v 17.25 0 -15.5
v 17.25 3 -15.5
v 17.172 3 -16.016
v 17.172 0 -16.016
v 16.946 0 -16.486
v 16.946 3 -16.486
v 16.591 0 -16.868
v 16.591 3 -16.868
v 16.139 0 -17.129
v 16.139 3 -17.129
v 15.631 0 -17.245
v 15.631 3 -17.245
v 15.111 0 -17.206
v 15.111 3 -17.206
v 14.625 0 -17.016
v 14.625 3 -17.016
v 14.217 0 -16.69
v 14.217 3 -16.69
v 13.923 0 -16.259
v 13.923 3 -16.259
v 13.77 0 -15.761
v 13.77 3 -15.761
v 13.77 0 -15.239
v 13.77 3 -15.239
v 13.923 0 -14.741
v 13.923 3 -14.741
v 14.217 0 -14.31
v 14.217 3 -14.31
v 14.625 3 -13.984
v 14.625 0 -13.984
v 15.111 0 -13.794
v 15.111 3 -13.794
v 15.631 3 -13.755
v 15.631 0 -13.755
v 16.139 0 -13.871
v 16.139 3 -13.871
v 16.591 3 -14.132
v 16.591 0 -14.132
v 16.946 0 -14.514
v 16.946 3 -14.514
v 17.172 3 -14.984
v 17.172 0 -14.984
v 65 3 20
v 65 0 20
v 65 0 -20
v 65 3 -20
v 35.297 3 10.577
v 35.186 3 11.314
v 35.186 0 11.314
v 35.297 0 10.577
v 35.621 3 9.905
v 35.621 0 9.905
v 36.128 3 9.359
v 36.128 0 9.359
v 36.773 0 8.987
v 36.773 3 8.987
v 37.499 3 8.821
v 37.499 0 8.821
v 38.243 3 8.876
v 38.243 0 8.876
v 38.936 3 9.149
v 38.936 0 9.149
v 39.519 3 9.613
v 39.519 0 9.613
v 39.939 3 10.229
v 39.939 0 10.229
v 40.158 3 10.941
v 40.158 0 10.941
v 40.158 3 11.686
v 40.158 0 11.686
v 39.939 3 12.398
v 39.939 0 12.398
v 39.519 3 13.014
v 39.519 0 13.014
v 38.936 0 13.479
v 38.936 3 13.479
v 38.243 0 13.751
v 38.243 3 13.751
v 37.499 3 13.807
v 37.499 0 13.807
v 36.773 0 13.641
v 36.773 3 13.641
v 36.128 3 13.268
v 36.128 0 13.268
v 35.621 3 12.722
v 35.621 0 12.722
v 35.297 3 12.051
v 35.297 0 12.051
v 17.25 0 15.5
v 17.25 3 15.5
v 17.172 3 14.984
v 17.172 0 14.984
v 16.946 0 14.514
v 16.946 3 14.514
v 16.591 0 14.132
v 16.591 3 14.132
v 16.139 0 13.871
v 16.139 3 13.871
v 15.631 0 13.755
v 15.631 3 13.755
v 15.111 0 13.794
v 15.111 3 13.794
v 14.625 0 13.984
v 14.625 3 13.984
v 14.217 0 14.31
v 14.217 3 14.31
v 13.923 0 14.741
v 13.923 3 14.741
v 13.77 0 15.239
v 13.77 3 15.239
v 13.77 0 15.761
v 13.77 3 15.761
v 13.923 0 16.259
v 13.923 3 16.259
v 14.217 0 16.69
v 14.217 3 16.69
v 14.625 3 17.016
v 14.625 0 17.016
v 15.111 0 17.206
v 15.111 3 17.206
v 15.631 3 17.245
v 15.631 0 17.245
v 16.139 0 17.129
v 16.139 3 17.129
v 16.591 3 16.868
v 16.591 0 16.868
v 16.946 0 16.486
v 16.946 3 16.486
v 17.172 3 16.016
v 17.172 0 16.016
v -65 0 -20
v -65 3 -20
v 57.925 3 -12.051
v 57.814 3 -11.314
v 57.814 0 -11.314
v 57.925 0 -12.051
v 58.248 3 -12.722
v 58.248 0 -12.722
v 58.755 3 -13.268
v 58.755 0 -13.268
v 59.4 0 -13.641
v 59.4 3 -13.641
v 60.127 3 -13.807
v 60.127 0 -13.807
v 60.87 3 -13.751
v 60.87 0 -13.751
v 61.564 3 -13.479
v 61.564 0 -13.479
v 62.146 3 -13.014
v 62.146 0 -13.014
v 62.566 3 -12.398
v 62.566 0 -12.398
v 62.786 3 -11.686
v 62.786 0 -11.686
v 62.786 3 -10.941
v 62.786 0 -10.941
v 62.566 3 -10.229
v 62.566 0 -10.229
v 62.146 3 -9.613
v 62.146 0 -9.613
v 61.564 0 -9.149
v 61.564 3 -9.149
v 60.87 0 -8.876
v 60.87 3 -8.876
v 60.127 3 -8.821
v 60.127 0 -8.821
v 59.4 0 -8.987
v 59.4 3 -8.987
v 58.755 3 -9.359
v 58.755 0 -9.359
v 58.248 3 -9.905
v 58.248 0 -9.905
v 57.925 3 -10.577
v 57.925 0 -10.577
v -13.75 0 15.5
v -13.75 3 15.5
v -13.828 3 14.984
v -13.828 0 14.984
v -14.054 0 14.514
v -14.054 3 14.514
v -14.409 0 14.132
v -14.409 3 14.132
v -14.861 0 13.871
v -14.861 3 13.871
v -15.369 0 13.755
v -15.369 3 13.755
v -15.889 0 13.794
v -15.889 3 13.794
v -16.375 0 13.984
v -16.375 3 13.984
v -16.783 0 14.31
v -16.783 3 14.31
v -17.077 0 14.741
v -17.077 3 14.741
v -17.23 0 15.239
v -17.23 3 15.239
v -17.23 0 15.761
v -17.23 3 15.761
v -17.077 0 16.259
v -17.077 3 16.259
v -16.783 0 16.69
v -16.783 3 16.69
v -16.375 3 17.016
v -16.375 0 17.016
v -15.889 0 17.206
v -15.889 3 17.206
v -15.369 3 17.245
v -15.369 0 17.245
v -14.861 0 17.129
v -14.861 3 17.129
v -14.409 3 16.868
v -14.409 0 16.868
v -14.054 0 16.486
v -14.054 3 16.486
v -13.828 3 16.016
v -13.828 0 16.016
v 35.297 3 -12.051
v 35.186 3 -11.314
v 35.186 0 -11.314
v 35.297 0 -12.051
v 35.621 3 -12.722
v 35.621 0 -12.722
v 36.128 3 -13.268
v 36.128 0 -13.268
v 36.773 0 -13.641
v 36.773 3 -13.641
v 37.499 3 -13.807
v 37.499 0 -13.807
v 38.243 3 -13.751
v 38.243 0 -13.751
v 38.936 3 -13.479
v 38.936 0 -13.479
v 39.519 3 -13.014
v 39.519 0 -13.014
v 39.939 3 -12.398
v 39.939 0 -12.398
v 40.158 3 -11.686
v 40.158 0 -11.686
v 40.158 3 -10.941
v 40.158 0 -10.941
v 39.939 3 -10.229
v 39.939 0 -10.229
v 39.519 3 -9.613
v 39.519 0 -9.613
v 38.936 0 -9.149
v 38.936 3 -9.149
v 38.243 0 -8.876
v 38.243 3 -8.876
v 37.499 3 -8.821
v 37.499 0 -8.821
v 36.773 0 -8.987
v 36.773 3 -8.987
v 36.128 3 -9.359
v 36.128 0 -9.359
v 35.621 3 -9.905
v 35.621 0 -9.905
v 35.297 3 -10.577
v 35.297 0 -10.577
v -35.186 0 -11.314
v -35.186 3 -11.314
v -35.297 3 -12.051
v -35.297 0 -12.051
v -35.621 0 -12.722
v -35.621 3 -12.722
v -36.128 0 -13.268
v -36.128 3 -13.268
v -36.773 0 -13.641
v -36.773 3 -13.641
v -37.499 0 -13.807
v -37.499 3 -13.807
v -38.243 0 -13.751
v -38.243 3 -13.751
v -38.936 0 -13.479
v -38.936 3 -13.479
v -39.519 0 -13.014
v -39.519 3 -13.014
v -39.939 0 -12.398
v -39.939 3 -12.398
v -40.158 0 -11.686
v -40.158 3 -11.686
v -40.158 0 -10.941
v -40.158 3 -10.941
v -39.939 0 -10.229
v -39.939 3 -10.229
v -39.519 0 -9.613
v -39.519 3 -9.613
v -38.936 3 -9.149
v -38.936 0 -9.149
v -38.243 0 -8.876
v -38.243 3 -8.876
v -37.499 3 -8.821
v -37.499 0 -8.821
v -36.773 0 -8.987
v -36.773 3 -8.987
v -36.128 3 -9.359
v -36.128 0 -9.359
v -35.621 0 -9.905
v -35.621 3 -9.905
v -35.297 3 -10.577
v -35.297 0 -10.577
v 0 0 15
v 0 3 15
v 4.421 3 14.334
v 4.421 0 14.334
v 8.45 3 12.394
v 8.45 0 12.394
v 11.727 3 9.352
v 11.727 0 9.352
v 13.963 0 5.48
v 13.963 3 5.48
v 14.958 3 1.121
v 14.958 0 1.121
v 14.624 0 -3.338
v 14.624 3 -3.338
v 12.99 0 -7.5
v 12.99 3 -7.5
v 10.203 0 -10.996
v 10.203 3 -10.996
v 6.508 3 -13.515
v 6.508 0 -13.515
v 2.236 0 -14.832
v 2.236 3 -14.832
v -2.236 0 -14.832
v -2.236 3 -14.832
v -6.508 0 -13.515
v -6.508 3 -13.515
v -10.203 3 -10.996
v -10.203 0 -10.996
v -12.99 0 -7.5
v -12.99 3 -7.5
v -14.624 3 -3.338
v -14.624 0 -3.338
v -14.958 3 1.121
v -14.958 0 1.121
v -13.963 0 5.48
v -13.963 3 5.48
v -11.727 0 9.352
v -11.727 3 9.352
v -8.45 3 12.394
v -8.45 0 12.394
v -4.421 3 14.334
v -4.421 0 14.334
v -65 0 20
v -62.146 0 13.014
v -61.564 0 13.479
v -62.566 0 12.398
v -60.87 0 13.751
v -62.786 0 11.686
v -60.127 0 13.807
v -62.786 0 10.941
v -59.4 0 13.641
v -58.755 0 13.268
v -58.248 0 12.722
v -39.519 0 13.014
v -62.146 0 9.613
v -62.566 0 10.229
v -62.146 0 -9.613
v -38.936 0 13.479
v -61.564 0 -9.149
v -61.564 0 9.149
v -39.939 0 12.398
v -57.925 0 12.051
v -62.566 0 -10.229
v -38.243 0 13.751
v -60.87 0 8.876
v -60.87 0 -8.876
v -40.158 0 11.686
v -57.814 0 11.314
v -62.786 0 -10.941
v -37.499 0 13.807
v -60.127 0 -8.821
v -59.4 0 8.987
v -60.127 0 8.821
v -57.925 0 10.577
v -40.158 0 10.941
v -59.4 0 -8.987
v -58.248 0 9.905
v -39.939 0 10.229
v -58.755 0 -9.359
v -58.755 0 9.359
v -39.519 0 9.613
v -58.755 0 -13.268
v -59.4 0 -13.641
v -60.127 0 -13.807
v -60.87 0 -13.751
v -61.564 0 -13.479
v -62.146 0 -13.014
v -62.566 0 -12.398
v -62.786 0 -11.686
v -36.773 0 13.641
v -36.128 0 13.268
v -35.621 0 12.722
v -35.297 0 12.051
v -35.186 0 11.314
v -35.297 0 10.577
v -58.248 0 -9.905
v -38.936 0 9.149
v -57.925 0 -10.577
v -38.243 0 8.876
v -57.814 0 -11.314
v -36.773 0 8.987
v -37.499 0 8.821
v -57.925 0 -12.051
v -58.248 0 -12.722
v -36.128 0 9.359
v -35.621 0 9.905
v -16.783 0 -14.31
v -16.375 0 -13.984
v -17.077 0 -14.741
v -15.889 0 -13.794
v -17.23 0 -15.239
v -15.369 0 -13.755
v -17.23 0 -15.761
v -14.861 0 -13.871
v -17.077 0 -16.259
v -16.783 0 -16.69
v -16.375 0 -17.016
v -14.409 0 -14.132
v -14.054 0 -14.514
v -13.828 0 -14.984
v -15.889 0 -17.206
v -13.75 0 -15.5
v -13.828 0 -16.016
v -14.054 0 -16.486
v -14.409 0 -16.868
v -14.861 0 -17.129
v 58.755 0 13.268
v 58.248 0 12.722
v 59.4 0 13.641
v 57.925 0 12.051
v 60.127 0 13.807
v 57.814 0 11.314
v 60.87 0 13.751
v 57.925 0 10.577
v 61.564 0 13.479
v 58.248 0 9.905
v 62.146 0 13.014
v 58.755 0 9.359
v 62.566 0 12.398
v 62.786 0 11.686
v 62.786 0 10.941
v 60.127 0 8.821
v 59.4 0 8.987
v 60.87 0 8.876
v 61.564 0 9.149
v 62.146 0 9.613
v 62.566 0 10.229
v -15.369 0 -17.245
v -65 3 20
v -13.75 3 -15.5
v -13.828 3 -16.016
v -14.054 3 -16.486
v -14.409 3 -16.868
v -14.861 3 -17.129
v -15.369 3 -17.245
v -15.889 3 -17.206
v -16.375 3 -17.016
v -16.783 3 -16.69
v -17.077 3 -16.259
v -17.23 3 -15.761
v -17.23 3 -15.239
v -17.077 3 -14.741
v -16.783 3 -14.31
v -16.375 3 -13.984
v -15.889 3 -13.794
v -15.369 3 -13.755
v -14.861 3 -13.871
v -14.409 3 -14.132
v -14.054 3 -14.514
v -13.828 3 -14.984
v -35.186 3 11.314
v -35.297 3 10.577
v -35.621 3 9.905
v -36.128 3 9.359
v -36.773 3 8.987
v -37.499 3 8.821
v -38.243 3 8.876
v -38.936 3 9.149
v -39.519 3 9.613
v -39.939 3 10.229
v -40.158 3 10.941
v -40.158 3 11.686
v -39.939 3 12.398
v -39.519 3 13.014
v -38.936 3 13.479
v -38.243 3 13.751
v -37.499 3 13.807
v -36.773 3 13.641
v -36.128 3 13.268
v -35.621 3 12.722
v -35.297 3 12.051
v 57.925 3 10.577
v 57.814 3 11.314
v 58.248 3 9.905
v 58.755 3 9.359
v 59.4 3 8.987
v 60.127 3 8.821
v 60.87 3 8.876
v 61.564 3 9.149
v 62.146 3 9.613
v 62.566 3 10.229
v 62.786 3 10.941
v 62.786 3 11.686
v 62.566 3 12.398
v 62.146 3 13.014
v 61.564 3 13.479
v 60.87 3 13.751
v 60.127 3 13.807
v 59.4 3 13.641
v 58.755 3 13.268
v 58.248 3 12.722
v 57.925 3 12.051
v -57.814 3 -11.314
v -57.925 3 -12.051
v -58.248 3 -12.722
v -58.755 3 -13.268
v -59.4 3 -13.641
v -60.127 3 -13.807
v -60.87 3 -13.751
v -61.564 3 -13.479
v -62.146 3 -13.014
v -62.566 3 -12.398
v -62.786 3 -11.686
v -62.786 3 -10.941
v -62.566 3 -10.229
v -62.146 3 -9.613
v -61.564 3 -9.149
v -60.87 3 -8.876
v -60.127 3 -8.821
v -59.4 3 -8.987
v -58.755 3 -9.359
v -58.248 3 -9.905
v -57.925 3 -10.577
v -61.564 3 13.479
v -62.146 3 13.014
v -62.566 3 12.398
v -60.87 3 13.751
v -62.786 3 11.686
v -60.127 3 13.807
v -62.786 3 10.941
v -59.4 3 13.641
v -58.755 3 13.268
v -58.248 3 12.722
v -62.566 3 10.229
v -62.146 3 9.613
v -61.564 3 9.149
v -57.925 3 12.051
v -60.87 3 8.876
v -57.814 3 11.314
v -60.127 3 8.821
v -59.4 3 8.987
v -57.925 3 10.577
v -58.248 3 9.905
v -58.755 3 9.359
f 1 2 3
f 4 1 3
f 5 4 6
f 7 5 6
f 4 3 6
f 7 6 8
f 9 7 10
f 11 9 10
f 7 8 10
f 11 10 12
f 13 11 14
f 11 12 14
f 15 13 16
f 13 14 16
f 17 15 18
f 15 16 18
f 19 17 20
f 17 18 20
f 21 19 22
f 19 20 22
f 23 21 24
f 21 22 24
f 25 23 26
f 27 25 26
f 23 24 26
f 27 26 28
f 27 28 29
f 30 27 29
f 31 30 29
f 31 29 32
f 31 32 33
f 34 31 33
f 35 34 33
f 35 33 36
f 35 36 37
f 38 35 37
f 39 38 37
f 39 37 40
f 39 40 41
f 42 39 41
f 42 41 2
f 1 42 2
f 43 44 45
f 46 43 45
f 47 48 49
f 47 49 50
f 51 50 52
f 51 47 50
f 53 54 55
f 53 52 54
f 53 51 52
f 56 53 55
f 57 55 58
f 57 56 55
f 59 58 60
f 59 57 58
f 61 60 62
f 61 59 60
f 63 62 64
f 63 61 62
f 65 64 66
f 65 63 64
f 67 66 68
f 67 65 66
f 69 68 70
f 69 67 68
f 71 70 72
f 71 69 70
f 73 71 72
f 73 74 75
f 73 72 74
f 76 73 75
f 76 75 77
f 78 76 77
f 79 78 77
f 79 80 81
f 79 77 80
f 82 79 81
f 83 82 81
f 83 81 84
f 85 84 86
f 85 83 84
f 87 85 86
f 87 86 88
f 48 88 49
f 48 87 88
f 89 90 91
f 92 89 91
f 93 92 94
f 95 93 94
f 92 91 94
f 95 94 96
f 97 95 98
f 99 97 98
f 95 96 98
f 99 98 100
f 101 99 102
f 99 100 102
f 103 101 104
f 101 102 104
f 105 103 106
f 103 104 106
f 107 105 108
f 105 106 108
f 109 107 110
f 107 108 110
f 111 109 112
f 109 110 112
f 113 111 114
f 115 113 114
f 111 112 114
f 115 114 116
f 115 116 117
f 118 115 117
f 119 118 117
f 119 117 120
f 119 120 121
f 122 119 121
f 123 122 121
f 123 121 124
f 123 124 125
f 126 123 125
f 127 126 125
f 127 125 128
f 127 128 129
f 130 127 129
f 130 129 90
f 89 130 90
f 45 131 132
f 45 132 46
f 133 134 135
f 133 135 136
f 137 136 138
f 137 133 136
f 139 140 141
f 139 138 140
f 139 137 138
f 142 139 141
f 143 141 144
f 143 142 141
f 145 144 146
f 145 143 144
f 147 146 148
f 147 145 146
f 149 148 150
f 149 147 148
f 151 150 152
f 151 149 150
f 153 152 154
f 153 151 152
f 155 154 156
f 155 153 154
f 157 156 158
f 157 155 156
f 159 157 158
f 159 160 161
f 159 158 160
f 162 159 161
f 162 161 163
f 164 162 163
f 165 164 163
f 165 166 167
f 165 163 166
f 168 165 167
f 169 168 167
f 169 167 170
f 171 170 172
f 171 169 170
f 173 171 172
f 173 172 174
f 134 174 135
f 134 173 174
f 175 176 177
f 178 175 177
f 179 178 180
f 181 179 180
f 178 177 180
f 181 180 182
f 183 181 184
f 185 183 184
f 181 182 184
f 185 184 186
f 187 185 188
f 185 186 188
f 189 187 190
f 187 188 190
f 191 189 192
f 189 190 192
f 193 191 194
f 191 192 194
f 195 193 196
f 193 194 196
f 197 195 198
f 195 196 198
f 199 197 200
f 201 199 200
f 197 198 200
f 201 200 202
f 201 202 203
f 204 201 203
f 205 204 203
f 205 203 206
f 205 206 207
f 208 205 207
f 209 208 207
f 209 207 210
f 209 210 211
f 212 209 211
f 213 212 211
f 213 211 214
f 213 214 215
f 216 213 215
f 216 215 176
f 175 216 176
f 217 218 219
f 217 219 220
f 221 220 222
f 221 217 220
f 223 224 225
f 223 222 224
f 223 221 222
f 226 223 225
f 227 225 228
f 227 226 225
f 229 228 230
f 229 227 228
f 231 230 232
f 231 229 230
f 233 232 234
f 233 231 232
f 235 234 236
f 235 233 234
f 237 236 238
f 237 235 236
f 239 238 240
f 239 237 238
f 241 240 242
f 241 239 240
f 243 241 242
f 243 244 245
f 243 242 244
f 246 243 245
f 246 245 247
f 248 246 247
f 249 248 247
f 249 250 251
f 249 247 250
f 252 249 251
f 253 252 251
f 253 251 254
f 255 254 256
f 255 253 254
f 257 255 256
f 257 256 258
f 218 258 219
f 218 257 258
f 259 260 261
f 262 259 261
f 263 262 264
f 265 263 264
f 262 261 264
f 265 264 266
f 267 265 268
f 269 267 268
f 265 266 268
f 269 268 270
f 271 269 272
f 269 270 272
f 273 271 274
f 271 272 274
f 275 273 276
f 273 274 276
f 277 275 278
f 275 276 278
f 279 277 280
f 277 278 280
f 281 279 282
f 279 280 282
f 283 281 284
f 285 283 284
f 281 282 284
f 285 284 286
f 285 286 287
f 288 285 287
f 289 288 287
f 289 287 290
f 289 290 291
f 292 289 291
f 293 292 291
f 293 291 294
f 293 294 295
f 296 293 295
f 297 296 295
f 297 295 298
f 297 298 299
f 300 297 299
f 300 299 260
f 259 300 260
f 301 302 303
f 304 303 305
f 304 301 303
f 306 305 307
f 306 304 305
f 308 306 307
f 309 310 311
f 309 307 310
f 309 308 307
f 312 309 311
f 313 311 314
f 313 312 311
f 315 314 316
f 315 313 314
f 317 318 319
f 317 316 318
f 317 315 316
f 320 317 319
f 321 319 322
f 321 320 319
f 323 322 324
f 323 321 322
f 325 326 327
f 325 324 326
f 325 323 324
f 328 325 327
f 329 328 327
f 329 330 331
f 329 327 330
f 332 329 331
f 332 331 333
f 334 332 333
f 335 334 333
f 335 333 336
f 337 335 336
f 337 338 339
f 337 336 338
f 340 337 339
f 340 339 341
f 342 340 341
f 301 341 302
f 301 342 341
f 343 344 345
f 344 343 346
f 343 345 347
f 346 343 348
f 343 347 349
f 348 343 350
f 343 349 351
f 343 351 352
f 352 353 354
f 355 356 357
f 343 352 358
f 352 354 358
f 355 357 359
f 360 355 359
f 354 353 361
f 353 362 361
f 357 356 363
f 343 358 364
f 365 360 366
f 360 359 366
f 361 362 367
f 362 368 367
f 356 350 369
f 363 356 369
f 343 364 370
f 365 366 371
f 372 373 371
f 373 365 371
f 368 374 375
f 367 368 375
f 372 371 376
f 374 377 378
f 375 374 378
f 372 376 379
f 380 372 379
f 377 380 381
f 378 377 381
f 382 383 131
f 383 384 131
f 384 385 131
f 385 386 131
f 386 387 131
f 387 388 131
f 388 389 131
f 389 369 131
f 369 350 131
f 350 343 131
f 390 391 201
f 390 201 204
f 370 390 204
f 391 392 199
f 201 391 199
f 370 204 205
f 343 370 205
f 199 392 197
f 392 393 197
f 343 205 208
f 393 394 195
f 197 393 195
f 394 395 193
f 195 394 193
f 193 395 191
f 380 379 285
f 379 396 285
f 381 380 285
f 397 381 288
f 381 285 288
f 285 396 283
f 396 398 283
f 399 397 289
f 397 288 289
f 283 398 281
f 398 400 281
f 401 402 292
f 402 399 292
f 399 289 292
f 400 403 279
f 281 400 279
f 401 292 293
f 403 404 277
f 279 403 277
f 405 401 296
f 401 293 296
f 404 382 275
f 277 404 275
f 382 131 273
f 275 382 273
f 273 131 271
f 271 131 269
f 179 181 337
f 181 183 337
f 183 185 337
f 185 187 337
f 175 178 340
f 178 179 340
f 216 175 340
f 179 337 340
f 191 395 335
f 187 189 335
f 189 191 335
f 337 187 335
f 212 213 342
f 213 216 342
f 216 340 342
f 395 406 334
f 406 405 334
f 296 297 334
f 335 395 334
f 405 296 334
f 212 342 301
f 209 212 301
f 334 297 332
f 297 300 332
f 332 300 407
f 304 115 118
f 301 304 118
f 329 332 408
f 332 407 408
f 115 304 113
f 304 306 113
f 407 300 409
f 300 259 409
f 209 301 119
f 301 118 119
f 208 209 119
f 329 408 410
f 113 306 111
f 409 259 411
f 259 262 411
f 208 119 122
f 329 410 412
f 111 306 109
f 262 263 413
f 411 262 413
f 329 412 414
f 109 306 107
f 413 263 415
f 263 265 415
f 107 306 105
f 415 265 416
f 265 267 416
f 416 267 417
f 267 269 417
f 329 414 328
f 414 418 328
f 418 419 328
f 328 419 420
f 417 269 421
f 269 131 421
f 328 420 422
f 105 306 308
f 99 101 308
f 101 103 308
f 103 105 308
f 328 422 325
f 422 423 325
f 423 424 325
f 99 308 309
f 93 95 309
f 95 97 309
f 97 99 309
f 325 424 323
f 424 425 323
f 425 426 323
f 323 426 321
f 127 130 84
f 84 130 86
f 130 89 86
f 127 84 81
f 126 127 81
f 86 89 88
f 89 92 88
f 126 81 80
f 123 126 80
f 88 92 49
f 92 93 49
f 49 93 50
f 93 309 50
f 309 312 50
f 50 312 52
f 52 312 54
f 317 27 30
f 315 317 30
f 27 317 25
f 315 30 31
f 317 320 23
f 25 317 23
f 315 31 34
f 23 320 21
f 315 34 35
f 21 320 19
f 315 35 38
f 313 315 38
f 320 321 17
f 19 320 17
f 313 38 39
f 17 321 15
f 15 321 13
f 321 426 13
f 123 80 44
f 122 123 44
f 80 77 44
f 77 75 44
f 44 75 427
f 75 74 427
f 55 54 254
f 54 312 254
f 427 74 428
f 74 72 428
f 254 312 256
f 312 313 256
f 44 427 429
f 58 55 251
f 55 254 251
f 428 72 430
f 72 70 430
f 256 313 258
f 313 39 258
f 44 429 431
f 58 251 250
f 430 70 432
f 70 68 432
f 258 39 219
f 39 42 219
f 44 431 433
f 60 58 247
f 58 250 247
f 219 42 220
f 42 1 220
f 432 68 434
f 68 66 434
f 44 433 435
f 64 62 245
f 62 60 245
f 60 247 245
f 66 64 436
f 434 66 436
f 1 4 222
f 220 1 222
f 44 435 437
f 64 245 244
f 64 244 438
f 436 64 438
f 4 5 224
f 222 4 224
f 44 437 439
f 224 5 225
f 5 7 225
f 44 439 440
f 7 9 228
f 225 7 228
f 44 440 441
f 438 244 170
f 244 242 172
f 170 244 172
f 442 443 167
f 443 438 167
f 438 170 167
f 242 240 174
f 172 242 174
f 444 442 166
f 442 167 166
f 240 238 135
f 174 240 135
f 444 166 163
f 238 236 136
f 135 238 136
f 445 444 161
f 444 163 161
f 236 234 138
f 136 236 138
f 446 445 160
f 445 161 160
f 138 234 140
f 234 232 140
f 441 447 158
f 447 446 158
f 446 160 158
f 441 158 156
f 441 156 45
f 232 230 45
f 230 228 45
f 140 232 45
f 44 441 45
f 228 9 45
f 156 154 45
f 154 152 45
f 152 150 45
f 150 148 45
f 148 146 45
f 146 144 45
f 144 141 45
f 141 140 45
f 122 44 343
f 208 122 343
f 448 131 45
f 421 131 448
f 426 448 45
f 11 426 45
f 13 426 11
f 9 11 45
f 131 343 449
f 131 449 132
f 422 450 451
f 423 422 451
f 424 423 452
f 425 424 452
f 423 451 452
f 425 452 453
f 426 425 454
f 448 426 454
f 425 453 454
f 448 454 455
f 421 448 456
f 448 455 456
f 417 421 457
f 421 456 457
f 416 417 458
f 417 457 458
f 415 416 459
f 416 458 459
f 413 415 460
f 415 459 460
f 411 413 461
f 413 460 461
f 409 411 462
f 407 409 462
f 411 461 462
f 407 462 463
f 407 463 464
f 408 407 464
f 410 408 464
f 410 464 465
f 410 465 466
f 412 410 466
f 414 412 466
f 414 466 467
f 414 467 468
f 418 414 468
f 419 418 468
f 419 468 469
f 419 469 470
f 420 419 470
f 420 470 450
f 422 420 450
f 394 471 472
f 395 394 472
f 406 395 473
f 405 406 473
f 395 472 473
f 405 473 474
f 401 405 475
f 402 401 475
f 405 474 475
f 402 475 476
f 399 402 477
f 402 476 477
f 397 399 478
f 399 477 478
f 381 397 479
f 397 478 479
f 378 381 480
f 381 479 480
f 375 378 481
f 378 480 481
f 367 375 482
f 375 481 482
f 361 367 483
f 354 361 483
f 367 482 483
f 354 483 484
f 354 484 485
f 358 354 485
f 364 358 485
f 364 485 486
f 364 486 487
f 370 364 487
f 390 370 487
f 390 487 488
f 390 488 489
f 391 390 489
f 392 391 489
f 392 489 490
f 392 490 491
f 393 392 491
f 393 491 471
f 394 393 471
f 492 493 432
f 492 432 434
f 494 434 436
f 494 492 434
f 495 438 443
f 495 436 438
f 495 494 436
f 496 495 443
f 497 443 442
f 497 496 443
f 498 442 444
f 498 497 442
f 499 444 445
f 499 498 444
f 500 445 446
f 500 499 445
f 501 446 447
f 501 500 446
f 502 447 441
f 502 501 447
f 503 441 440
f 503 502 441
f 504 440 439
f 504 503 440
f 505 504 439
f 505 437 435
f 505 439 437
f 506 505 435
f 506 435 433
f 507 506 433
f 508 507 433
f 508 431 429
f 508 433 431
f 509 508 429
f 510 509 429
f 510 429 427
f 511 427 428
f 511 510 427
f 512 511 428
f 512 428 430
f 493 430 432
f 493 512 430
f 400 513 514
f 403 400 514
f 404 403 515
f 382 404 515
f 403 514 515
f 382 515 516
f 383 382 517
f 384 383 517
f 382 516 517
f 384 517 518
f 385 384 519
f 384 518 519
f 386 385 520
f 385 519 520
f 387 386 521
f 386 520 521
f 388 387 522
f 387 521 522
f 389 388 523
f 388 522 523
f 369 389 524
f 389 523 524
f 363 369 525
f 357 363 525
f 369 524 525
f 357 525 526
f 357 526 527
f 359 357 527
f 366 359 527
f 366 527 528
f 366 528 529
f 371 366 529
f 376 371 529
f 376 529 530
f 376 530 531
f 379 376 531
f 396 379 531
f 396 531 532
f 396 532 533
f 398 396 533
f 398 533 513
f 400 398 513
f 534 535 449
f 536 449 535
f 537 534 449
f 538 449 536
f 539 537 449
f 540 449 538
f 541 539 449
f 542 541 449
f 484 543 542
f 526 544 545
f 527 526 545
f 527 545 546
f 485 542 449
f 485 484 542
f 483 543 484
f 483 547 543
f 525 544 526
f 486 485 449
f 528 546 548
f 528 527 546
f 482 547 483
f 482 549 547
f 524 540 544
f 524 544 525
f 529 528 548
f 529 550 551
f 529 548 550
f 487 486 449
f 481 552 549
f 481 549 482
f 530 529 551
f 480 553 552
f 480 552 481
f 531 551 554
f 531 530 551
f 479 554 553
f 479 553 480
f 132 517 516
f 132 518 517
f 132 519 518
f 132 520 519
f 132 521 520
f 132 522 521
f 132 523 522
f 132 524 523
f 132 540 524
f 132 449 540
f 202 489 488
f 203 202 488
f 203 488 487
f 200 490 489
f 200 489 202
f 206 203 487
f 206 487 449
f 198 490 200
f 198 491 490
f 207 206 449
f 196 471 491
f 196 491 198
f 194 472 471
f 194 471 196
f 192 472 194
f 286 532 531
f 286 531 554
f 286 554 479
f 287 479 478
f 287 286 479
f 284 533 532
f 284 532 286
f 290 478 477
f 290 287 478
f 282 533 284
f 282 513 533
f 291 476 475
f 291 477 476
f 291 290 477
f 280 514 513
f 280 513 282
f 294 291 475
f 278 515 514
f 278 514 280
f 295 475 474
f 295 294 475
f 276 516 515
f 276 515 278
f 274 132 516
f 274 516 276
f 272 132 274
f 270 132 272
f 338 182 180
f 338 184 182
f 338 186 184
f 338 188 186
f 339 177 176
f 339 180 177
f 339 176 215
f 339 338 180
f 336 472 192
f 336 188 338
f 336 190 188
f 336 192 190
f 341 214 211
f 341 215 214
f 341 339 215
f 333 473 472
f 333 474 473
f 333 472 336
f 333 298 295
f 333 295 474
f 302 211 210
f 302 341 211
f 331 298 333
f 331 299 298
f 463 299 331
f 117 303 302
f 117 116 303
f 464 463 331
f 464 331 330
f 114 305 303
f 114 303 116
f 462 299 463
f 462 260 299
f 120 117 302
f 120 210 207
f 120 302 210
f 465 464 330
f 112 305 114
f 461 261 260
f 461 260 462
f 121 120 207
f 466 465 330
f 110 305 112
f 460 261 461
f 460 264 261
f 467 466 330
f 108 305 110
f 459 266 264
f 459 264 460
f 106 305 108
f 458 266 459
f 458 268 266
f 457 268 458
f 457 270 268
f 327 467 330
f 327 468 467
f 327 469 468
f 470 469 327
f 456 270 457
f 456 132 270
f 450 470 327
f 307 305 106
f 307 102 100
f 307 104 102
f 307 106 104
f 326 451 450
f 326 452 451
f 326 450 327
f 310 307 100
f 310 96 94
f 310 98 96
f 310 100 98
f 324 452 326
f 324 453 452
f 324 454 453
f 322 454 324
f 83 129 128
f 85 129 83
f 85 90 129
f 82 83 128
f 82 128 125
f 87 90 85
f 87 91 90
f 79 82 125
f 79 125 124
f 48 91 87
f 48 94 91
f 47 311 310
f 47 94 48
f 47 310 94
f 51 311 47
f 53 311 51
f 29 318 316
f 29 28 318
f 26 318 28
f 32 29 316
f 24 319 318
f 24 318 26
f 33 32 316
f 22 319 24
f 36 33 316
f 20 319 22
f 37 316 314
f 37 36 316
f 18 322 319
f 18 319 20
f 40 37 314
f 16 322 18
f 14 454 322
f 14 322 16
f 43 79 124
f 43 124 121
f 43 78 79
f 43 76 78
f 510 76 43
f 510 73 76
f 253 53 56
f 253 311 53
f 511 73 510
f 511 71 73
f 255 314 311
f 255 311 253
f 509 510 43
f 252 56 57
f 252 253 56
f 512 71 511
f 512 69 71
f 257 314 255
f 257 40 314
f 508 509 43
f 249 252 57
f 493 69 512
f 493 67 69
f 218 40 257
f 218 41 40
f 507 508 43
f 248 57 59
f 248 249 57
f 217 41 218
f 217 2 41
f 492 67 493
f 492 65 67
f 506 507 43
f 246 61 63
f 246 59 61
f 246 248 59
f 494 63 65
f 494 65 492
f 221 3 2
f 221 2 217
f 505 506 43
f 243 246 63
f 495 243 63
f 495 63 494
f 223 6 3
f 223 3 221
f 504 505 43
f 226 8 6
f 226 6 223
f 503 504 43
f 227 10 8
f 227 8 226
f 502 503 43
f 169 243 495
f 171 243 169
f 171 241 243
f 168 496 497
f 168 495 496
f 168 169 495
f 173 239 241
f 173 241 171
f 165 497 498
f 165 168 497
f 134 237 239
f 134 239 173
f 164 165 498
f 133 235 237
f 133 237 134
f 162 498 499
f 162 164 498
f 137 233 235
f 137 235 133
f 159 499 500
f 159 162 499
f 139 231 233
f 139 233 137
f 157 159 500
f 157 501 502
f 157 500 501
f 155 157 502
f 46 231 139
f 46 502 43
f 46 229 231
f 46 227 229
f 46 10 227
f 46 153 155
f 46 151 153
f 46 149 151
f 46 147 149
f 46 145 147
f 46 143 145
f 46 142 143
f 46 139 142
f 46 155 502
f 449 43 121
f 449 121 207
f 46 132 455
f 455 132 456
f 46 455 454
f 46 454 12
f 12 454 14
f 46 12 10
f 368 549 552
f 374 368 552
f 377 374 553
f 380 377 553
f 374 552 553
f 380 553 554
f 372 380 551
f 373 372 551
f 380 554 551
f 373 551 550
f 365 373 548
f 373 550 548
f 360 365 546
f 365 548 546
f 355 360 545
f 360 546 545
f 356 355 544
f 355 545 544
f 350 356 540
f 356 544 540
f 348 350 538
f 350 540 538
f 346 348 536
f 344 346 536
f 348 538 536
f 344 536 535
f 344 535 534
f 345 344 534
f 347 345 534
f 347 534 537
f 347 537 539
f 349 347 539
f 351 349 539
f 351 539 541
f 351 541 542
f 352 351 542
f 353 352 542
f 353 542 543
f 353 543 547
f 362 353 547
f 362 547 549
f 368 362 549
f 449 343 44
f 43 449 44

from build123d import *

# Parameters (mm, degrees)
SKETCH1_W                  = 130
SKETCH1_H                  = 40
BOSS_EXTRUDE1_DEPTH        = 3
SKETCH2_R                  = 15
CUT_EXTRUDE1_DEPTH         = 69.0734897
F_5_0_5_DIAMETER_HOLE1_D   = 5
F_3_5_3_5_DIAMETER_HOLE1_D = 3.5


with BuildPart() as part:
    # Sketch1 → Boss-Extrude1 (new body)
    with BuildSketch(Plane(origin=(0, 0, 0), x_dir=(1, 0, 0), z_dir=(0, 1, 0))):
        Rectangle(SKETCH1_W, SKETCH1_H)
    extrude(amount=BOSS_EXTRUDE1_DEPTH)

    # Sketch2 → Cut-Extrude1 (cut, through all)
    with BuildSketch(Plane(origin=(0, 0, 0), x_dir=(1, 0, 0), z_dir=(0, 1, 0))):
        with Locations(Location((0, 0, 0), (0, 0, 270))):
            Circle(SKETCH2_R)
    extrude(amount=CUT_EXTRUDE1_DEPTH, mode=Mode.SUBTRACT)

    # Ø5.0 (5) Diameter Hole1 (through all)
    with Locations(Plane(origin=(0, 0, 0), x_dir=(-1, 0, 0), z_dir=(0, -1, 0))):
        with Locations((60.313708499, 11.313708499), (60.313708499, -11.313708499), (37.686291501, -11.313708499), (37.686291501, 11.313708499)):
            f_5_0_5_diameter_hole1 = Hole(F_5_0_5_DIAMETER_HOLE1_D / 2)

    # Mirror1: Ø5.0 (5) Diameter Hole1 across plane
    add(f_5_0_5_diameter_hole1.mirror(Plane(origin=(0, 0, 0), x_dir=(0, 0, 1), z_dir=(1, 0, 0))), mode=Mode.SUBTRACT)

    # Ø3.5 (3.5) Diameter Hole1 (through all)
    with Locations(Plane(origin=(0, 0, 0), x_dir=(-1, 0, 0), z_dir=(0, -1, 0))):
        with Locations((0, 0), (-15.5, 15.5), (15.5, -15.5), (15.5, 15.5), (-15.5, -15.5)):
            Hole(F_3_5_3_5_DIAMETER_HOLE1_D / 2)


solid = part.part
